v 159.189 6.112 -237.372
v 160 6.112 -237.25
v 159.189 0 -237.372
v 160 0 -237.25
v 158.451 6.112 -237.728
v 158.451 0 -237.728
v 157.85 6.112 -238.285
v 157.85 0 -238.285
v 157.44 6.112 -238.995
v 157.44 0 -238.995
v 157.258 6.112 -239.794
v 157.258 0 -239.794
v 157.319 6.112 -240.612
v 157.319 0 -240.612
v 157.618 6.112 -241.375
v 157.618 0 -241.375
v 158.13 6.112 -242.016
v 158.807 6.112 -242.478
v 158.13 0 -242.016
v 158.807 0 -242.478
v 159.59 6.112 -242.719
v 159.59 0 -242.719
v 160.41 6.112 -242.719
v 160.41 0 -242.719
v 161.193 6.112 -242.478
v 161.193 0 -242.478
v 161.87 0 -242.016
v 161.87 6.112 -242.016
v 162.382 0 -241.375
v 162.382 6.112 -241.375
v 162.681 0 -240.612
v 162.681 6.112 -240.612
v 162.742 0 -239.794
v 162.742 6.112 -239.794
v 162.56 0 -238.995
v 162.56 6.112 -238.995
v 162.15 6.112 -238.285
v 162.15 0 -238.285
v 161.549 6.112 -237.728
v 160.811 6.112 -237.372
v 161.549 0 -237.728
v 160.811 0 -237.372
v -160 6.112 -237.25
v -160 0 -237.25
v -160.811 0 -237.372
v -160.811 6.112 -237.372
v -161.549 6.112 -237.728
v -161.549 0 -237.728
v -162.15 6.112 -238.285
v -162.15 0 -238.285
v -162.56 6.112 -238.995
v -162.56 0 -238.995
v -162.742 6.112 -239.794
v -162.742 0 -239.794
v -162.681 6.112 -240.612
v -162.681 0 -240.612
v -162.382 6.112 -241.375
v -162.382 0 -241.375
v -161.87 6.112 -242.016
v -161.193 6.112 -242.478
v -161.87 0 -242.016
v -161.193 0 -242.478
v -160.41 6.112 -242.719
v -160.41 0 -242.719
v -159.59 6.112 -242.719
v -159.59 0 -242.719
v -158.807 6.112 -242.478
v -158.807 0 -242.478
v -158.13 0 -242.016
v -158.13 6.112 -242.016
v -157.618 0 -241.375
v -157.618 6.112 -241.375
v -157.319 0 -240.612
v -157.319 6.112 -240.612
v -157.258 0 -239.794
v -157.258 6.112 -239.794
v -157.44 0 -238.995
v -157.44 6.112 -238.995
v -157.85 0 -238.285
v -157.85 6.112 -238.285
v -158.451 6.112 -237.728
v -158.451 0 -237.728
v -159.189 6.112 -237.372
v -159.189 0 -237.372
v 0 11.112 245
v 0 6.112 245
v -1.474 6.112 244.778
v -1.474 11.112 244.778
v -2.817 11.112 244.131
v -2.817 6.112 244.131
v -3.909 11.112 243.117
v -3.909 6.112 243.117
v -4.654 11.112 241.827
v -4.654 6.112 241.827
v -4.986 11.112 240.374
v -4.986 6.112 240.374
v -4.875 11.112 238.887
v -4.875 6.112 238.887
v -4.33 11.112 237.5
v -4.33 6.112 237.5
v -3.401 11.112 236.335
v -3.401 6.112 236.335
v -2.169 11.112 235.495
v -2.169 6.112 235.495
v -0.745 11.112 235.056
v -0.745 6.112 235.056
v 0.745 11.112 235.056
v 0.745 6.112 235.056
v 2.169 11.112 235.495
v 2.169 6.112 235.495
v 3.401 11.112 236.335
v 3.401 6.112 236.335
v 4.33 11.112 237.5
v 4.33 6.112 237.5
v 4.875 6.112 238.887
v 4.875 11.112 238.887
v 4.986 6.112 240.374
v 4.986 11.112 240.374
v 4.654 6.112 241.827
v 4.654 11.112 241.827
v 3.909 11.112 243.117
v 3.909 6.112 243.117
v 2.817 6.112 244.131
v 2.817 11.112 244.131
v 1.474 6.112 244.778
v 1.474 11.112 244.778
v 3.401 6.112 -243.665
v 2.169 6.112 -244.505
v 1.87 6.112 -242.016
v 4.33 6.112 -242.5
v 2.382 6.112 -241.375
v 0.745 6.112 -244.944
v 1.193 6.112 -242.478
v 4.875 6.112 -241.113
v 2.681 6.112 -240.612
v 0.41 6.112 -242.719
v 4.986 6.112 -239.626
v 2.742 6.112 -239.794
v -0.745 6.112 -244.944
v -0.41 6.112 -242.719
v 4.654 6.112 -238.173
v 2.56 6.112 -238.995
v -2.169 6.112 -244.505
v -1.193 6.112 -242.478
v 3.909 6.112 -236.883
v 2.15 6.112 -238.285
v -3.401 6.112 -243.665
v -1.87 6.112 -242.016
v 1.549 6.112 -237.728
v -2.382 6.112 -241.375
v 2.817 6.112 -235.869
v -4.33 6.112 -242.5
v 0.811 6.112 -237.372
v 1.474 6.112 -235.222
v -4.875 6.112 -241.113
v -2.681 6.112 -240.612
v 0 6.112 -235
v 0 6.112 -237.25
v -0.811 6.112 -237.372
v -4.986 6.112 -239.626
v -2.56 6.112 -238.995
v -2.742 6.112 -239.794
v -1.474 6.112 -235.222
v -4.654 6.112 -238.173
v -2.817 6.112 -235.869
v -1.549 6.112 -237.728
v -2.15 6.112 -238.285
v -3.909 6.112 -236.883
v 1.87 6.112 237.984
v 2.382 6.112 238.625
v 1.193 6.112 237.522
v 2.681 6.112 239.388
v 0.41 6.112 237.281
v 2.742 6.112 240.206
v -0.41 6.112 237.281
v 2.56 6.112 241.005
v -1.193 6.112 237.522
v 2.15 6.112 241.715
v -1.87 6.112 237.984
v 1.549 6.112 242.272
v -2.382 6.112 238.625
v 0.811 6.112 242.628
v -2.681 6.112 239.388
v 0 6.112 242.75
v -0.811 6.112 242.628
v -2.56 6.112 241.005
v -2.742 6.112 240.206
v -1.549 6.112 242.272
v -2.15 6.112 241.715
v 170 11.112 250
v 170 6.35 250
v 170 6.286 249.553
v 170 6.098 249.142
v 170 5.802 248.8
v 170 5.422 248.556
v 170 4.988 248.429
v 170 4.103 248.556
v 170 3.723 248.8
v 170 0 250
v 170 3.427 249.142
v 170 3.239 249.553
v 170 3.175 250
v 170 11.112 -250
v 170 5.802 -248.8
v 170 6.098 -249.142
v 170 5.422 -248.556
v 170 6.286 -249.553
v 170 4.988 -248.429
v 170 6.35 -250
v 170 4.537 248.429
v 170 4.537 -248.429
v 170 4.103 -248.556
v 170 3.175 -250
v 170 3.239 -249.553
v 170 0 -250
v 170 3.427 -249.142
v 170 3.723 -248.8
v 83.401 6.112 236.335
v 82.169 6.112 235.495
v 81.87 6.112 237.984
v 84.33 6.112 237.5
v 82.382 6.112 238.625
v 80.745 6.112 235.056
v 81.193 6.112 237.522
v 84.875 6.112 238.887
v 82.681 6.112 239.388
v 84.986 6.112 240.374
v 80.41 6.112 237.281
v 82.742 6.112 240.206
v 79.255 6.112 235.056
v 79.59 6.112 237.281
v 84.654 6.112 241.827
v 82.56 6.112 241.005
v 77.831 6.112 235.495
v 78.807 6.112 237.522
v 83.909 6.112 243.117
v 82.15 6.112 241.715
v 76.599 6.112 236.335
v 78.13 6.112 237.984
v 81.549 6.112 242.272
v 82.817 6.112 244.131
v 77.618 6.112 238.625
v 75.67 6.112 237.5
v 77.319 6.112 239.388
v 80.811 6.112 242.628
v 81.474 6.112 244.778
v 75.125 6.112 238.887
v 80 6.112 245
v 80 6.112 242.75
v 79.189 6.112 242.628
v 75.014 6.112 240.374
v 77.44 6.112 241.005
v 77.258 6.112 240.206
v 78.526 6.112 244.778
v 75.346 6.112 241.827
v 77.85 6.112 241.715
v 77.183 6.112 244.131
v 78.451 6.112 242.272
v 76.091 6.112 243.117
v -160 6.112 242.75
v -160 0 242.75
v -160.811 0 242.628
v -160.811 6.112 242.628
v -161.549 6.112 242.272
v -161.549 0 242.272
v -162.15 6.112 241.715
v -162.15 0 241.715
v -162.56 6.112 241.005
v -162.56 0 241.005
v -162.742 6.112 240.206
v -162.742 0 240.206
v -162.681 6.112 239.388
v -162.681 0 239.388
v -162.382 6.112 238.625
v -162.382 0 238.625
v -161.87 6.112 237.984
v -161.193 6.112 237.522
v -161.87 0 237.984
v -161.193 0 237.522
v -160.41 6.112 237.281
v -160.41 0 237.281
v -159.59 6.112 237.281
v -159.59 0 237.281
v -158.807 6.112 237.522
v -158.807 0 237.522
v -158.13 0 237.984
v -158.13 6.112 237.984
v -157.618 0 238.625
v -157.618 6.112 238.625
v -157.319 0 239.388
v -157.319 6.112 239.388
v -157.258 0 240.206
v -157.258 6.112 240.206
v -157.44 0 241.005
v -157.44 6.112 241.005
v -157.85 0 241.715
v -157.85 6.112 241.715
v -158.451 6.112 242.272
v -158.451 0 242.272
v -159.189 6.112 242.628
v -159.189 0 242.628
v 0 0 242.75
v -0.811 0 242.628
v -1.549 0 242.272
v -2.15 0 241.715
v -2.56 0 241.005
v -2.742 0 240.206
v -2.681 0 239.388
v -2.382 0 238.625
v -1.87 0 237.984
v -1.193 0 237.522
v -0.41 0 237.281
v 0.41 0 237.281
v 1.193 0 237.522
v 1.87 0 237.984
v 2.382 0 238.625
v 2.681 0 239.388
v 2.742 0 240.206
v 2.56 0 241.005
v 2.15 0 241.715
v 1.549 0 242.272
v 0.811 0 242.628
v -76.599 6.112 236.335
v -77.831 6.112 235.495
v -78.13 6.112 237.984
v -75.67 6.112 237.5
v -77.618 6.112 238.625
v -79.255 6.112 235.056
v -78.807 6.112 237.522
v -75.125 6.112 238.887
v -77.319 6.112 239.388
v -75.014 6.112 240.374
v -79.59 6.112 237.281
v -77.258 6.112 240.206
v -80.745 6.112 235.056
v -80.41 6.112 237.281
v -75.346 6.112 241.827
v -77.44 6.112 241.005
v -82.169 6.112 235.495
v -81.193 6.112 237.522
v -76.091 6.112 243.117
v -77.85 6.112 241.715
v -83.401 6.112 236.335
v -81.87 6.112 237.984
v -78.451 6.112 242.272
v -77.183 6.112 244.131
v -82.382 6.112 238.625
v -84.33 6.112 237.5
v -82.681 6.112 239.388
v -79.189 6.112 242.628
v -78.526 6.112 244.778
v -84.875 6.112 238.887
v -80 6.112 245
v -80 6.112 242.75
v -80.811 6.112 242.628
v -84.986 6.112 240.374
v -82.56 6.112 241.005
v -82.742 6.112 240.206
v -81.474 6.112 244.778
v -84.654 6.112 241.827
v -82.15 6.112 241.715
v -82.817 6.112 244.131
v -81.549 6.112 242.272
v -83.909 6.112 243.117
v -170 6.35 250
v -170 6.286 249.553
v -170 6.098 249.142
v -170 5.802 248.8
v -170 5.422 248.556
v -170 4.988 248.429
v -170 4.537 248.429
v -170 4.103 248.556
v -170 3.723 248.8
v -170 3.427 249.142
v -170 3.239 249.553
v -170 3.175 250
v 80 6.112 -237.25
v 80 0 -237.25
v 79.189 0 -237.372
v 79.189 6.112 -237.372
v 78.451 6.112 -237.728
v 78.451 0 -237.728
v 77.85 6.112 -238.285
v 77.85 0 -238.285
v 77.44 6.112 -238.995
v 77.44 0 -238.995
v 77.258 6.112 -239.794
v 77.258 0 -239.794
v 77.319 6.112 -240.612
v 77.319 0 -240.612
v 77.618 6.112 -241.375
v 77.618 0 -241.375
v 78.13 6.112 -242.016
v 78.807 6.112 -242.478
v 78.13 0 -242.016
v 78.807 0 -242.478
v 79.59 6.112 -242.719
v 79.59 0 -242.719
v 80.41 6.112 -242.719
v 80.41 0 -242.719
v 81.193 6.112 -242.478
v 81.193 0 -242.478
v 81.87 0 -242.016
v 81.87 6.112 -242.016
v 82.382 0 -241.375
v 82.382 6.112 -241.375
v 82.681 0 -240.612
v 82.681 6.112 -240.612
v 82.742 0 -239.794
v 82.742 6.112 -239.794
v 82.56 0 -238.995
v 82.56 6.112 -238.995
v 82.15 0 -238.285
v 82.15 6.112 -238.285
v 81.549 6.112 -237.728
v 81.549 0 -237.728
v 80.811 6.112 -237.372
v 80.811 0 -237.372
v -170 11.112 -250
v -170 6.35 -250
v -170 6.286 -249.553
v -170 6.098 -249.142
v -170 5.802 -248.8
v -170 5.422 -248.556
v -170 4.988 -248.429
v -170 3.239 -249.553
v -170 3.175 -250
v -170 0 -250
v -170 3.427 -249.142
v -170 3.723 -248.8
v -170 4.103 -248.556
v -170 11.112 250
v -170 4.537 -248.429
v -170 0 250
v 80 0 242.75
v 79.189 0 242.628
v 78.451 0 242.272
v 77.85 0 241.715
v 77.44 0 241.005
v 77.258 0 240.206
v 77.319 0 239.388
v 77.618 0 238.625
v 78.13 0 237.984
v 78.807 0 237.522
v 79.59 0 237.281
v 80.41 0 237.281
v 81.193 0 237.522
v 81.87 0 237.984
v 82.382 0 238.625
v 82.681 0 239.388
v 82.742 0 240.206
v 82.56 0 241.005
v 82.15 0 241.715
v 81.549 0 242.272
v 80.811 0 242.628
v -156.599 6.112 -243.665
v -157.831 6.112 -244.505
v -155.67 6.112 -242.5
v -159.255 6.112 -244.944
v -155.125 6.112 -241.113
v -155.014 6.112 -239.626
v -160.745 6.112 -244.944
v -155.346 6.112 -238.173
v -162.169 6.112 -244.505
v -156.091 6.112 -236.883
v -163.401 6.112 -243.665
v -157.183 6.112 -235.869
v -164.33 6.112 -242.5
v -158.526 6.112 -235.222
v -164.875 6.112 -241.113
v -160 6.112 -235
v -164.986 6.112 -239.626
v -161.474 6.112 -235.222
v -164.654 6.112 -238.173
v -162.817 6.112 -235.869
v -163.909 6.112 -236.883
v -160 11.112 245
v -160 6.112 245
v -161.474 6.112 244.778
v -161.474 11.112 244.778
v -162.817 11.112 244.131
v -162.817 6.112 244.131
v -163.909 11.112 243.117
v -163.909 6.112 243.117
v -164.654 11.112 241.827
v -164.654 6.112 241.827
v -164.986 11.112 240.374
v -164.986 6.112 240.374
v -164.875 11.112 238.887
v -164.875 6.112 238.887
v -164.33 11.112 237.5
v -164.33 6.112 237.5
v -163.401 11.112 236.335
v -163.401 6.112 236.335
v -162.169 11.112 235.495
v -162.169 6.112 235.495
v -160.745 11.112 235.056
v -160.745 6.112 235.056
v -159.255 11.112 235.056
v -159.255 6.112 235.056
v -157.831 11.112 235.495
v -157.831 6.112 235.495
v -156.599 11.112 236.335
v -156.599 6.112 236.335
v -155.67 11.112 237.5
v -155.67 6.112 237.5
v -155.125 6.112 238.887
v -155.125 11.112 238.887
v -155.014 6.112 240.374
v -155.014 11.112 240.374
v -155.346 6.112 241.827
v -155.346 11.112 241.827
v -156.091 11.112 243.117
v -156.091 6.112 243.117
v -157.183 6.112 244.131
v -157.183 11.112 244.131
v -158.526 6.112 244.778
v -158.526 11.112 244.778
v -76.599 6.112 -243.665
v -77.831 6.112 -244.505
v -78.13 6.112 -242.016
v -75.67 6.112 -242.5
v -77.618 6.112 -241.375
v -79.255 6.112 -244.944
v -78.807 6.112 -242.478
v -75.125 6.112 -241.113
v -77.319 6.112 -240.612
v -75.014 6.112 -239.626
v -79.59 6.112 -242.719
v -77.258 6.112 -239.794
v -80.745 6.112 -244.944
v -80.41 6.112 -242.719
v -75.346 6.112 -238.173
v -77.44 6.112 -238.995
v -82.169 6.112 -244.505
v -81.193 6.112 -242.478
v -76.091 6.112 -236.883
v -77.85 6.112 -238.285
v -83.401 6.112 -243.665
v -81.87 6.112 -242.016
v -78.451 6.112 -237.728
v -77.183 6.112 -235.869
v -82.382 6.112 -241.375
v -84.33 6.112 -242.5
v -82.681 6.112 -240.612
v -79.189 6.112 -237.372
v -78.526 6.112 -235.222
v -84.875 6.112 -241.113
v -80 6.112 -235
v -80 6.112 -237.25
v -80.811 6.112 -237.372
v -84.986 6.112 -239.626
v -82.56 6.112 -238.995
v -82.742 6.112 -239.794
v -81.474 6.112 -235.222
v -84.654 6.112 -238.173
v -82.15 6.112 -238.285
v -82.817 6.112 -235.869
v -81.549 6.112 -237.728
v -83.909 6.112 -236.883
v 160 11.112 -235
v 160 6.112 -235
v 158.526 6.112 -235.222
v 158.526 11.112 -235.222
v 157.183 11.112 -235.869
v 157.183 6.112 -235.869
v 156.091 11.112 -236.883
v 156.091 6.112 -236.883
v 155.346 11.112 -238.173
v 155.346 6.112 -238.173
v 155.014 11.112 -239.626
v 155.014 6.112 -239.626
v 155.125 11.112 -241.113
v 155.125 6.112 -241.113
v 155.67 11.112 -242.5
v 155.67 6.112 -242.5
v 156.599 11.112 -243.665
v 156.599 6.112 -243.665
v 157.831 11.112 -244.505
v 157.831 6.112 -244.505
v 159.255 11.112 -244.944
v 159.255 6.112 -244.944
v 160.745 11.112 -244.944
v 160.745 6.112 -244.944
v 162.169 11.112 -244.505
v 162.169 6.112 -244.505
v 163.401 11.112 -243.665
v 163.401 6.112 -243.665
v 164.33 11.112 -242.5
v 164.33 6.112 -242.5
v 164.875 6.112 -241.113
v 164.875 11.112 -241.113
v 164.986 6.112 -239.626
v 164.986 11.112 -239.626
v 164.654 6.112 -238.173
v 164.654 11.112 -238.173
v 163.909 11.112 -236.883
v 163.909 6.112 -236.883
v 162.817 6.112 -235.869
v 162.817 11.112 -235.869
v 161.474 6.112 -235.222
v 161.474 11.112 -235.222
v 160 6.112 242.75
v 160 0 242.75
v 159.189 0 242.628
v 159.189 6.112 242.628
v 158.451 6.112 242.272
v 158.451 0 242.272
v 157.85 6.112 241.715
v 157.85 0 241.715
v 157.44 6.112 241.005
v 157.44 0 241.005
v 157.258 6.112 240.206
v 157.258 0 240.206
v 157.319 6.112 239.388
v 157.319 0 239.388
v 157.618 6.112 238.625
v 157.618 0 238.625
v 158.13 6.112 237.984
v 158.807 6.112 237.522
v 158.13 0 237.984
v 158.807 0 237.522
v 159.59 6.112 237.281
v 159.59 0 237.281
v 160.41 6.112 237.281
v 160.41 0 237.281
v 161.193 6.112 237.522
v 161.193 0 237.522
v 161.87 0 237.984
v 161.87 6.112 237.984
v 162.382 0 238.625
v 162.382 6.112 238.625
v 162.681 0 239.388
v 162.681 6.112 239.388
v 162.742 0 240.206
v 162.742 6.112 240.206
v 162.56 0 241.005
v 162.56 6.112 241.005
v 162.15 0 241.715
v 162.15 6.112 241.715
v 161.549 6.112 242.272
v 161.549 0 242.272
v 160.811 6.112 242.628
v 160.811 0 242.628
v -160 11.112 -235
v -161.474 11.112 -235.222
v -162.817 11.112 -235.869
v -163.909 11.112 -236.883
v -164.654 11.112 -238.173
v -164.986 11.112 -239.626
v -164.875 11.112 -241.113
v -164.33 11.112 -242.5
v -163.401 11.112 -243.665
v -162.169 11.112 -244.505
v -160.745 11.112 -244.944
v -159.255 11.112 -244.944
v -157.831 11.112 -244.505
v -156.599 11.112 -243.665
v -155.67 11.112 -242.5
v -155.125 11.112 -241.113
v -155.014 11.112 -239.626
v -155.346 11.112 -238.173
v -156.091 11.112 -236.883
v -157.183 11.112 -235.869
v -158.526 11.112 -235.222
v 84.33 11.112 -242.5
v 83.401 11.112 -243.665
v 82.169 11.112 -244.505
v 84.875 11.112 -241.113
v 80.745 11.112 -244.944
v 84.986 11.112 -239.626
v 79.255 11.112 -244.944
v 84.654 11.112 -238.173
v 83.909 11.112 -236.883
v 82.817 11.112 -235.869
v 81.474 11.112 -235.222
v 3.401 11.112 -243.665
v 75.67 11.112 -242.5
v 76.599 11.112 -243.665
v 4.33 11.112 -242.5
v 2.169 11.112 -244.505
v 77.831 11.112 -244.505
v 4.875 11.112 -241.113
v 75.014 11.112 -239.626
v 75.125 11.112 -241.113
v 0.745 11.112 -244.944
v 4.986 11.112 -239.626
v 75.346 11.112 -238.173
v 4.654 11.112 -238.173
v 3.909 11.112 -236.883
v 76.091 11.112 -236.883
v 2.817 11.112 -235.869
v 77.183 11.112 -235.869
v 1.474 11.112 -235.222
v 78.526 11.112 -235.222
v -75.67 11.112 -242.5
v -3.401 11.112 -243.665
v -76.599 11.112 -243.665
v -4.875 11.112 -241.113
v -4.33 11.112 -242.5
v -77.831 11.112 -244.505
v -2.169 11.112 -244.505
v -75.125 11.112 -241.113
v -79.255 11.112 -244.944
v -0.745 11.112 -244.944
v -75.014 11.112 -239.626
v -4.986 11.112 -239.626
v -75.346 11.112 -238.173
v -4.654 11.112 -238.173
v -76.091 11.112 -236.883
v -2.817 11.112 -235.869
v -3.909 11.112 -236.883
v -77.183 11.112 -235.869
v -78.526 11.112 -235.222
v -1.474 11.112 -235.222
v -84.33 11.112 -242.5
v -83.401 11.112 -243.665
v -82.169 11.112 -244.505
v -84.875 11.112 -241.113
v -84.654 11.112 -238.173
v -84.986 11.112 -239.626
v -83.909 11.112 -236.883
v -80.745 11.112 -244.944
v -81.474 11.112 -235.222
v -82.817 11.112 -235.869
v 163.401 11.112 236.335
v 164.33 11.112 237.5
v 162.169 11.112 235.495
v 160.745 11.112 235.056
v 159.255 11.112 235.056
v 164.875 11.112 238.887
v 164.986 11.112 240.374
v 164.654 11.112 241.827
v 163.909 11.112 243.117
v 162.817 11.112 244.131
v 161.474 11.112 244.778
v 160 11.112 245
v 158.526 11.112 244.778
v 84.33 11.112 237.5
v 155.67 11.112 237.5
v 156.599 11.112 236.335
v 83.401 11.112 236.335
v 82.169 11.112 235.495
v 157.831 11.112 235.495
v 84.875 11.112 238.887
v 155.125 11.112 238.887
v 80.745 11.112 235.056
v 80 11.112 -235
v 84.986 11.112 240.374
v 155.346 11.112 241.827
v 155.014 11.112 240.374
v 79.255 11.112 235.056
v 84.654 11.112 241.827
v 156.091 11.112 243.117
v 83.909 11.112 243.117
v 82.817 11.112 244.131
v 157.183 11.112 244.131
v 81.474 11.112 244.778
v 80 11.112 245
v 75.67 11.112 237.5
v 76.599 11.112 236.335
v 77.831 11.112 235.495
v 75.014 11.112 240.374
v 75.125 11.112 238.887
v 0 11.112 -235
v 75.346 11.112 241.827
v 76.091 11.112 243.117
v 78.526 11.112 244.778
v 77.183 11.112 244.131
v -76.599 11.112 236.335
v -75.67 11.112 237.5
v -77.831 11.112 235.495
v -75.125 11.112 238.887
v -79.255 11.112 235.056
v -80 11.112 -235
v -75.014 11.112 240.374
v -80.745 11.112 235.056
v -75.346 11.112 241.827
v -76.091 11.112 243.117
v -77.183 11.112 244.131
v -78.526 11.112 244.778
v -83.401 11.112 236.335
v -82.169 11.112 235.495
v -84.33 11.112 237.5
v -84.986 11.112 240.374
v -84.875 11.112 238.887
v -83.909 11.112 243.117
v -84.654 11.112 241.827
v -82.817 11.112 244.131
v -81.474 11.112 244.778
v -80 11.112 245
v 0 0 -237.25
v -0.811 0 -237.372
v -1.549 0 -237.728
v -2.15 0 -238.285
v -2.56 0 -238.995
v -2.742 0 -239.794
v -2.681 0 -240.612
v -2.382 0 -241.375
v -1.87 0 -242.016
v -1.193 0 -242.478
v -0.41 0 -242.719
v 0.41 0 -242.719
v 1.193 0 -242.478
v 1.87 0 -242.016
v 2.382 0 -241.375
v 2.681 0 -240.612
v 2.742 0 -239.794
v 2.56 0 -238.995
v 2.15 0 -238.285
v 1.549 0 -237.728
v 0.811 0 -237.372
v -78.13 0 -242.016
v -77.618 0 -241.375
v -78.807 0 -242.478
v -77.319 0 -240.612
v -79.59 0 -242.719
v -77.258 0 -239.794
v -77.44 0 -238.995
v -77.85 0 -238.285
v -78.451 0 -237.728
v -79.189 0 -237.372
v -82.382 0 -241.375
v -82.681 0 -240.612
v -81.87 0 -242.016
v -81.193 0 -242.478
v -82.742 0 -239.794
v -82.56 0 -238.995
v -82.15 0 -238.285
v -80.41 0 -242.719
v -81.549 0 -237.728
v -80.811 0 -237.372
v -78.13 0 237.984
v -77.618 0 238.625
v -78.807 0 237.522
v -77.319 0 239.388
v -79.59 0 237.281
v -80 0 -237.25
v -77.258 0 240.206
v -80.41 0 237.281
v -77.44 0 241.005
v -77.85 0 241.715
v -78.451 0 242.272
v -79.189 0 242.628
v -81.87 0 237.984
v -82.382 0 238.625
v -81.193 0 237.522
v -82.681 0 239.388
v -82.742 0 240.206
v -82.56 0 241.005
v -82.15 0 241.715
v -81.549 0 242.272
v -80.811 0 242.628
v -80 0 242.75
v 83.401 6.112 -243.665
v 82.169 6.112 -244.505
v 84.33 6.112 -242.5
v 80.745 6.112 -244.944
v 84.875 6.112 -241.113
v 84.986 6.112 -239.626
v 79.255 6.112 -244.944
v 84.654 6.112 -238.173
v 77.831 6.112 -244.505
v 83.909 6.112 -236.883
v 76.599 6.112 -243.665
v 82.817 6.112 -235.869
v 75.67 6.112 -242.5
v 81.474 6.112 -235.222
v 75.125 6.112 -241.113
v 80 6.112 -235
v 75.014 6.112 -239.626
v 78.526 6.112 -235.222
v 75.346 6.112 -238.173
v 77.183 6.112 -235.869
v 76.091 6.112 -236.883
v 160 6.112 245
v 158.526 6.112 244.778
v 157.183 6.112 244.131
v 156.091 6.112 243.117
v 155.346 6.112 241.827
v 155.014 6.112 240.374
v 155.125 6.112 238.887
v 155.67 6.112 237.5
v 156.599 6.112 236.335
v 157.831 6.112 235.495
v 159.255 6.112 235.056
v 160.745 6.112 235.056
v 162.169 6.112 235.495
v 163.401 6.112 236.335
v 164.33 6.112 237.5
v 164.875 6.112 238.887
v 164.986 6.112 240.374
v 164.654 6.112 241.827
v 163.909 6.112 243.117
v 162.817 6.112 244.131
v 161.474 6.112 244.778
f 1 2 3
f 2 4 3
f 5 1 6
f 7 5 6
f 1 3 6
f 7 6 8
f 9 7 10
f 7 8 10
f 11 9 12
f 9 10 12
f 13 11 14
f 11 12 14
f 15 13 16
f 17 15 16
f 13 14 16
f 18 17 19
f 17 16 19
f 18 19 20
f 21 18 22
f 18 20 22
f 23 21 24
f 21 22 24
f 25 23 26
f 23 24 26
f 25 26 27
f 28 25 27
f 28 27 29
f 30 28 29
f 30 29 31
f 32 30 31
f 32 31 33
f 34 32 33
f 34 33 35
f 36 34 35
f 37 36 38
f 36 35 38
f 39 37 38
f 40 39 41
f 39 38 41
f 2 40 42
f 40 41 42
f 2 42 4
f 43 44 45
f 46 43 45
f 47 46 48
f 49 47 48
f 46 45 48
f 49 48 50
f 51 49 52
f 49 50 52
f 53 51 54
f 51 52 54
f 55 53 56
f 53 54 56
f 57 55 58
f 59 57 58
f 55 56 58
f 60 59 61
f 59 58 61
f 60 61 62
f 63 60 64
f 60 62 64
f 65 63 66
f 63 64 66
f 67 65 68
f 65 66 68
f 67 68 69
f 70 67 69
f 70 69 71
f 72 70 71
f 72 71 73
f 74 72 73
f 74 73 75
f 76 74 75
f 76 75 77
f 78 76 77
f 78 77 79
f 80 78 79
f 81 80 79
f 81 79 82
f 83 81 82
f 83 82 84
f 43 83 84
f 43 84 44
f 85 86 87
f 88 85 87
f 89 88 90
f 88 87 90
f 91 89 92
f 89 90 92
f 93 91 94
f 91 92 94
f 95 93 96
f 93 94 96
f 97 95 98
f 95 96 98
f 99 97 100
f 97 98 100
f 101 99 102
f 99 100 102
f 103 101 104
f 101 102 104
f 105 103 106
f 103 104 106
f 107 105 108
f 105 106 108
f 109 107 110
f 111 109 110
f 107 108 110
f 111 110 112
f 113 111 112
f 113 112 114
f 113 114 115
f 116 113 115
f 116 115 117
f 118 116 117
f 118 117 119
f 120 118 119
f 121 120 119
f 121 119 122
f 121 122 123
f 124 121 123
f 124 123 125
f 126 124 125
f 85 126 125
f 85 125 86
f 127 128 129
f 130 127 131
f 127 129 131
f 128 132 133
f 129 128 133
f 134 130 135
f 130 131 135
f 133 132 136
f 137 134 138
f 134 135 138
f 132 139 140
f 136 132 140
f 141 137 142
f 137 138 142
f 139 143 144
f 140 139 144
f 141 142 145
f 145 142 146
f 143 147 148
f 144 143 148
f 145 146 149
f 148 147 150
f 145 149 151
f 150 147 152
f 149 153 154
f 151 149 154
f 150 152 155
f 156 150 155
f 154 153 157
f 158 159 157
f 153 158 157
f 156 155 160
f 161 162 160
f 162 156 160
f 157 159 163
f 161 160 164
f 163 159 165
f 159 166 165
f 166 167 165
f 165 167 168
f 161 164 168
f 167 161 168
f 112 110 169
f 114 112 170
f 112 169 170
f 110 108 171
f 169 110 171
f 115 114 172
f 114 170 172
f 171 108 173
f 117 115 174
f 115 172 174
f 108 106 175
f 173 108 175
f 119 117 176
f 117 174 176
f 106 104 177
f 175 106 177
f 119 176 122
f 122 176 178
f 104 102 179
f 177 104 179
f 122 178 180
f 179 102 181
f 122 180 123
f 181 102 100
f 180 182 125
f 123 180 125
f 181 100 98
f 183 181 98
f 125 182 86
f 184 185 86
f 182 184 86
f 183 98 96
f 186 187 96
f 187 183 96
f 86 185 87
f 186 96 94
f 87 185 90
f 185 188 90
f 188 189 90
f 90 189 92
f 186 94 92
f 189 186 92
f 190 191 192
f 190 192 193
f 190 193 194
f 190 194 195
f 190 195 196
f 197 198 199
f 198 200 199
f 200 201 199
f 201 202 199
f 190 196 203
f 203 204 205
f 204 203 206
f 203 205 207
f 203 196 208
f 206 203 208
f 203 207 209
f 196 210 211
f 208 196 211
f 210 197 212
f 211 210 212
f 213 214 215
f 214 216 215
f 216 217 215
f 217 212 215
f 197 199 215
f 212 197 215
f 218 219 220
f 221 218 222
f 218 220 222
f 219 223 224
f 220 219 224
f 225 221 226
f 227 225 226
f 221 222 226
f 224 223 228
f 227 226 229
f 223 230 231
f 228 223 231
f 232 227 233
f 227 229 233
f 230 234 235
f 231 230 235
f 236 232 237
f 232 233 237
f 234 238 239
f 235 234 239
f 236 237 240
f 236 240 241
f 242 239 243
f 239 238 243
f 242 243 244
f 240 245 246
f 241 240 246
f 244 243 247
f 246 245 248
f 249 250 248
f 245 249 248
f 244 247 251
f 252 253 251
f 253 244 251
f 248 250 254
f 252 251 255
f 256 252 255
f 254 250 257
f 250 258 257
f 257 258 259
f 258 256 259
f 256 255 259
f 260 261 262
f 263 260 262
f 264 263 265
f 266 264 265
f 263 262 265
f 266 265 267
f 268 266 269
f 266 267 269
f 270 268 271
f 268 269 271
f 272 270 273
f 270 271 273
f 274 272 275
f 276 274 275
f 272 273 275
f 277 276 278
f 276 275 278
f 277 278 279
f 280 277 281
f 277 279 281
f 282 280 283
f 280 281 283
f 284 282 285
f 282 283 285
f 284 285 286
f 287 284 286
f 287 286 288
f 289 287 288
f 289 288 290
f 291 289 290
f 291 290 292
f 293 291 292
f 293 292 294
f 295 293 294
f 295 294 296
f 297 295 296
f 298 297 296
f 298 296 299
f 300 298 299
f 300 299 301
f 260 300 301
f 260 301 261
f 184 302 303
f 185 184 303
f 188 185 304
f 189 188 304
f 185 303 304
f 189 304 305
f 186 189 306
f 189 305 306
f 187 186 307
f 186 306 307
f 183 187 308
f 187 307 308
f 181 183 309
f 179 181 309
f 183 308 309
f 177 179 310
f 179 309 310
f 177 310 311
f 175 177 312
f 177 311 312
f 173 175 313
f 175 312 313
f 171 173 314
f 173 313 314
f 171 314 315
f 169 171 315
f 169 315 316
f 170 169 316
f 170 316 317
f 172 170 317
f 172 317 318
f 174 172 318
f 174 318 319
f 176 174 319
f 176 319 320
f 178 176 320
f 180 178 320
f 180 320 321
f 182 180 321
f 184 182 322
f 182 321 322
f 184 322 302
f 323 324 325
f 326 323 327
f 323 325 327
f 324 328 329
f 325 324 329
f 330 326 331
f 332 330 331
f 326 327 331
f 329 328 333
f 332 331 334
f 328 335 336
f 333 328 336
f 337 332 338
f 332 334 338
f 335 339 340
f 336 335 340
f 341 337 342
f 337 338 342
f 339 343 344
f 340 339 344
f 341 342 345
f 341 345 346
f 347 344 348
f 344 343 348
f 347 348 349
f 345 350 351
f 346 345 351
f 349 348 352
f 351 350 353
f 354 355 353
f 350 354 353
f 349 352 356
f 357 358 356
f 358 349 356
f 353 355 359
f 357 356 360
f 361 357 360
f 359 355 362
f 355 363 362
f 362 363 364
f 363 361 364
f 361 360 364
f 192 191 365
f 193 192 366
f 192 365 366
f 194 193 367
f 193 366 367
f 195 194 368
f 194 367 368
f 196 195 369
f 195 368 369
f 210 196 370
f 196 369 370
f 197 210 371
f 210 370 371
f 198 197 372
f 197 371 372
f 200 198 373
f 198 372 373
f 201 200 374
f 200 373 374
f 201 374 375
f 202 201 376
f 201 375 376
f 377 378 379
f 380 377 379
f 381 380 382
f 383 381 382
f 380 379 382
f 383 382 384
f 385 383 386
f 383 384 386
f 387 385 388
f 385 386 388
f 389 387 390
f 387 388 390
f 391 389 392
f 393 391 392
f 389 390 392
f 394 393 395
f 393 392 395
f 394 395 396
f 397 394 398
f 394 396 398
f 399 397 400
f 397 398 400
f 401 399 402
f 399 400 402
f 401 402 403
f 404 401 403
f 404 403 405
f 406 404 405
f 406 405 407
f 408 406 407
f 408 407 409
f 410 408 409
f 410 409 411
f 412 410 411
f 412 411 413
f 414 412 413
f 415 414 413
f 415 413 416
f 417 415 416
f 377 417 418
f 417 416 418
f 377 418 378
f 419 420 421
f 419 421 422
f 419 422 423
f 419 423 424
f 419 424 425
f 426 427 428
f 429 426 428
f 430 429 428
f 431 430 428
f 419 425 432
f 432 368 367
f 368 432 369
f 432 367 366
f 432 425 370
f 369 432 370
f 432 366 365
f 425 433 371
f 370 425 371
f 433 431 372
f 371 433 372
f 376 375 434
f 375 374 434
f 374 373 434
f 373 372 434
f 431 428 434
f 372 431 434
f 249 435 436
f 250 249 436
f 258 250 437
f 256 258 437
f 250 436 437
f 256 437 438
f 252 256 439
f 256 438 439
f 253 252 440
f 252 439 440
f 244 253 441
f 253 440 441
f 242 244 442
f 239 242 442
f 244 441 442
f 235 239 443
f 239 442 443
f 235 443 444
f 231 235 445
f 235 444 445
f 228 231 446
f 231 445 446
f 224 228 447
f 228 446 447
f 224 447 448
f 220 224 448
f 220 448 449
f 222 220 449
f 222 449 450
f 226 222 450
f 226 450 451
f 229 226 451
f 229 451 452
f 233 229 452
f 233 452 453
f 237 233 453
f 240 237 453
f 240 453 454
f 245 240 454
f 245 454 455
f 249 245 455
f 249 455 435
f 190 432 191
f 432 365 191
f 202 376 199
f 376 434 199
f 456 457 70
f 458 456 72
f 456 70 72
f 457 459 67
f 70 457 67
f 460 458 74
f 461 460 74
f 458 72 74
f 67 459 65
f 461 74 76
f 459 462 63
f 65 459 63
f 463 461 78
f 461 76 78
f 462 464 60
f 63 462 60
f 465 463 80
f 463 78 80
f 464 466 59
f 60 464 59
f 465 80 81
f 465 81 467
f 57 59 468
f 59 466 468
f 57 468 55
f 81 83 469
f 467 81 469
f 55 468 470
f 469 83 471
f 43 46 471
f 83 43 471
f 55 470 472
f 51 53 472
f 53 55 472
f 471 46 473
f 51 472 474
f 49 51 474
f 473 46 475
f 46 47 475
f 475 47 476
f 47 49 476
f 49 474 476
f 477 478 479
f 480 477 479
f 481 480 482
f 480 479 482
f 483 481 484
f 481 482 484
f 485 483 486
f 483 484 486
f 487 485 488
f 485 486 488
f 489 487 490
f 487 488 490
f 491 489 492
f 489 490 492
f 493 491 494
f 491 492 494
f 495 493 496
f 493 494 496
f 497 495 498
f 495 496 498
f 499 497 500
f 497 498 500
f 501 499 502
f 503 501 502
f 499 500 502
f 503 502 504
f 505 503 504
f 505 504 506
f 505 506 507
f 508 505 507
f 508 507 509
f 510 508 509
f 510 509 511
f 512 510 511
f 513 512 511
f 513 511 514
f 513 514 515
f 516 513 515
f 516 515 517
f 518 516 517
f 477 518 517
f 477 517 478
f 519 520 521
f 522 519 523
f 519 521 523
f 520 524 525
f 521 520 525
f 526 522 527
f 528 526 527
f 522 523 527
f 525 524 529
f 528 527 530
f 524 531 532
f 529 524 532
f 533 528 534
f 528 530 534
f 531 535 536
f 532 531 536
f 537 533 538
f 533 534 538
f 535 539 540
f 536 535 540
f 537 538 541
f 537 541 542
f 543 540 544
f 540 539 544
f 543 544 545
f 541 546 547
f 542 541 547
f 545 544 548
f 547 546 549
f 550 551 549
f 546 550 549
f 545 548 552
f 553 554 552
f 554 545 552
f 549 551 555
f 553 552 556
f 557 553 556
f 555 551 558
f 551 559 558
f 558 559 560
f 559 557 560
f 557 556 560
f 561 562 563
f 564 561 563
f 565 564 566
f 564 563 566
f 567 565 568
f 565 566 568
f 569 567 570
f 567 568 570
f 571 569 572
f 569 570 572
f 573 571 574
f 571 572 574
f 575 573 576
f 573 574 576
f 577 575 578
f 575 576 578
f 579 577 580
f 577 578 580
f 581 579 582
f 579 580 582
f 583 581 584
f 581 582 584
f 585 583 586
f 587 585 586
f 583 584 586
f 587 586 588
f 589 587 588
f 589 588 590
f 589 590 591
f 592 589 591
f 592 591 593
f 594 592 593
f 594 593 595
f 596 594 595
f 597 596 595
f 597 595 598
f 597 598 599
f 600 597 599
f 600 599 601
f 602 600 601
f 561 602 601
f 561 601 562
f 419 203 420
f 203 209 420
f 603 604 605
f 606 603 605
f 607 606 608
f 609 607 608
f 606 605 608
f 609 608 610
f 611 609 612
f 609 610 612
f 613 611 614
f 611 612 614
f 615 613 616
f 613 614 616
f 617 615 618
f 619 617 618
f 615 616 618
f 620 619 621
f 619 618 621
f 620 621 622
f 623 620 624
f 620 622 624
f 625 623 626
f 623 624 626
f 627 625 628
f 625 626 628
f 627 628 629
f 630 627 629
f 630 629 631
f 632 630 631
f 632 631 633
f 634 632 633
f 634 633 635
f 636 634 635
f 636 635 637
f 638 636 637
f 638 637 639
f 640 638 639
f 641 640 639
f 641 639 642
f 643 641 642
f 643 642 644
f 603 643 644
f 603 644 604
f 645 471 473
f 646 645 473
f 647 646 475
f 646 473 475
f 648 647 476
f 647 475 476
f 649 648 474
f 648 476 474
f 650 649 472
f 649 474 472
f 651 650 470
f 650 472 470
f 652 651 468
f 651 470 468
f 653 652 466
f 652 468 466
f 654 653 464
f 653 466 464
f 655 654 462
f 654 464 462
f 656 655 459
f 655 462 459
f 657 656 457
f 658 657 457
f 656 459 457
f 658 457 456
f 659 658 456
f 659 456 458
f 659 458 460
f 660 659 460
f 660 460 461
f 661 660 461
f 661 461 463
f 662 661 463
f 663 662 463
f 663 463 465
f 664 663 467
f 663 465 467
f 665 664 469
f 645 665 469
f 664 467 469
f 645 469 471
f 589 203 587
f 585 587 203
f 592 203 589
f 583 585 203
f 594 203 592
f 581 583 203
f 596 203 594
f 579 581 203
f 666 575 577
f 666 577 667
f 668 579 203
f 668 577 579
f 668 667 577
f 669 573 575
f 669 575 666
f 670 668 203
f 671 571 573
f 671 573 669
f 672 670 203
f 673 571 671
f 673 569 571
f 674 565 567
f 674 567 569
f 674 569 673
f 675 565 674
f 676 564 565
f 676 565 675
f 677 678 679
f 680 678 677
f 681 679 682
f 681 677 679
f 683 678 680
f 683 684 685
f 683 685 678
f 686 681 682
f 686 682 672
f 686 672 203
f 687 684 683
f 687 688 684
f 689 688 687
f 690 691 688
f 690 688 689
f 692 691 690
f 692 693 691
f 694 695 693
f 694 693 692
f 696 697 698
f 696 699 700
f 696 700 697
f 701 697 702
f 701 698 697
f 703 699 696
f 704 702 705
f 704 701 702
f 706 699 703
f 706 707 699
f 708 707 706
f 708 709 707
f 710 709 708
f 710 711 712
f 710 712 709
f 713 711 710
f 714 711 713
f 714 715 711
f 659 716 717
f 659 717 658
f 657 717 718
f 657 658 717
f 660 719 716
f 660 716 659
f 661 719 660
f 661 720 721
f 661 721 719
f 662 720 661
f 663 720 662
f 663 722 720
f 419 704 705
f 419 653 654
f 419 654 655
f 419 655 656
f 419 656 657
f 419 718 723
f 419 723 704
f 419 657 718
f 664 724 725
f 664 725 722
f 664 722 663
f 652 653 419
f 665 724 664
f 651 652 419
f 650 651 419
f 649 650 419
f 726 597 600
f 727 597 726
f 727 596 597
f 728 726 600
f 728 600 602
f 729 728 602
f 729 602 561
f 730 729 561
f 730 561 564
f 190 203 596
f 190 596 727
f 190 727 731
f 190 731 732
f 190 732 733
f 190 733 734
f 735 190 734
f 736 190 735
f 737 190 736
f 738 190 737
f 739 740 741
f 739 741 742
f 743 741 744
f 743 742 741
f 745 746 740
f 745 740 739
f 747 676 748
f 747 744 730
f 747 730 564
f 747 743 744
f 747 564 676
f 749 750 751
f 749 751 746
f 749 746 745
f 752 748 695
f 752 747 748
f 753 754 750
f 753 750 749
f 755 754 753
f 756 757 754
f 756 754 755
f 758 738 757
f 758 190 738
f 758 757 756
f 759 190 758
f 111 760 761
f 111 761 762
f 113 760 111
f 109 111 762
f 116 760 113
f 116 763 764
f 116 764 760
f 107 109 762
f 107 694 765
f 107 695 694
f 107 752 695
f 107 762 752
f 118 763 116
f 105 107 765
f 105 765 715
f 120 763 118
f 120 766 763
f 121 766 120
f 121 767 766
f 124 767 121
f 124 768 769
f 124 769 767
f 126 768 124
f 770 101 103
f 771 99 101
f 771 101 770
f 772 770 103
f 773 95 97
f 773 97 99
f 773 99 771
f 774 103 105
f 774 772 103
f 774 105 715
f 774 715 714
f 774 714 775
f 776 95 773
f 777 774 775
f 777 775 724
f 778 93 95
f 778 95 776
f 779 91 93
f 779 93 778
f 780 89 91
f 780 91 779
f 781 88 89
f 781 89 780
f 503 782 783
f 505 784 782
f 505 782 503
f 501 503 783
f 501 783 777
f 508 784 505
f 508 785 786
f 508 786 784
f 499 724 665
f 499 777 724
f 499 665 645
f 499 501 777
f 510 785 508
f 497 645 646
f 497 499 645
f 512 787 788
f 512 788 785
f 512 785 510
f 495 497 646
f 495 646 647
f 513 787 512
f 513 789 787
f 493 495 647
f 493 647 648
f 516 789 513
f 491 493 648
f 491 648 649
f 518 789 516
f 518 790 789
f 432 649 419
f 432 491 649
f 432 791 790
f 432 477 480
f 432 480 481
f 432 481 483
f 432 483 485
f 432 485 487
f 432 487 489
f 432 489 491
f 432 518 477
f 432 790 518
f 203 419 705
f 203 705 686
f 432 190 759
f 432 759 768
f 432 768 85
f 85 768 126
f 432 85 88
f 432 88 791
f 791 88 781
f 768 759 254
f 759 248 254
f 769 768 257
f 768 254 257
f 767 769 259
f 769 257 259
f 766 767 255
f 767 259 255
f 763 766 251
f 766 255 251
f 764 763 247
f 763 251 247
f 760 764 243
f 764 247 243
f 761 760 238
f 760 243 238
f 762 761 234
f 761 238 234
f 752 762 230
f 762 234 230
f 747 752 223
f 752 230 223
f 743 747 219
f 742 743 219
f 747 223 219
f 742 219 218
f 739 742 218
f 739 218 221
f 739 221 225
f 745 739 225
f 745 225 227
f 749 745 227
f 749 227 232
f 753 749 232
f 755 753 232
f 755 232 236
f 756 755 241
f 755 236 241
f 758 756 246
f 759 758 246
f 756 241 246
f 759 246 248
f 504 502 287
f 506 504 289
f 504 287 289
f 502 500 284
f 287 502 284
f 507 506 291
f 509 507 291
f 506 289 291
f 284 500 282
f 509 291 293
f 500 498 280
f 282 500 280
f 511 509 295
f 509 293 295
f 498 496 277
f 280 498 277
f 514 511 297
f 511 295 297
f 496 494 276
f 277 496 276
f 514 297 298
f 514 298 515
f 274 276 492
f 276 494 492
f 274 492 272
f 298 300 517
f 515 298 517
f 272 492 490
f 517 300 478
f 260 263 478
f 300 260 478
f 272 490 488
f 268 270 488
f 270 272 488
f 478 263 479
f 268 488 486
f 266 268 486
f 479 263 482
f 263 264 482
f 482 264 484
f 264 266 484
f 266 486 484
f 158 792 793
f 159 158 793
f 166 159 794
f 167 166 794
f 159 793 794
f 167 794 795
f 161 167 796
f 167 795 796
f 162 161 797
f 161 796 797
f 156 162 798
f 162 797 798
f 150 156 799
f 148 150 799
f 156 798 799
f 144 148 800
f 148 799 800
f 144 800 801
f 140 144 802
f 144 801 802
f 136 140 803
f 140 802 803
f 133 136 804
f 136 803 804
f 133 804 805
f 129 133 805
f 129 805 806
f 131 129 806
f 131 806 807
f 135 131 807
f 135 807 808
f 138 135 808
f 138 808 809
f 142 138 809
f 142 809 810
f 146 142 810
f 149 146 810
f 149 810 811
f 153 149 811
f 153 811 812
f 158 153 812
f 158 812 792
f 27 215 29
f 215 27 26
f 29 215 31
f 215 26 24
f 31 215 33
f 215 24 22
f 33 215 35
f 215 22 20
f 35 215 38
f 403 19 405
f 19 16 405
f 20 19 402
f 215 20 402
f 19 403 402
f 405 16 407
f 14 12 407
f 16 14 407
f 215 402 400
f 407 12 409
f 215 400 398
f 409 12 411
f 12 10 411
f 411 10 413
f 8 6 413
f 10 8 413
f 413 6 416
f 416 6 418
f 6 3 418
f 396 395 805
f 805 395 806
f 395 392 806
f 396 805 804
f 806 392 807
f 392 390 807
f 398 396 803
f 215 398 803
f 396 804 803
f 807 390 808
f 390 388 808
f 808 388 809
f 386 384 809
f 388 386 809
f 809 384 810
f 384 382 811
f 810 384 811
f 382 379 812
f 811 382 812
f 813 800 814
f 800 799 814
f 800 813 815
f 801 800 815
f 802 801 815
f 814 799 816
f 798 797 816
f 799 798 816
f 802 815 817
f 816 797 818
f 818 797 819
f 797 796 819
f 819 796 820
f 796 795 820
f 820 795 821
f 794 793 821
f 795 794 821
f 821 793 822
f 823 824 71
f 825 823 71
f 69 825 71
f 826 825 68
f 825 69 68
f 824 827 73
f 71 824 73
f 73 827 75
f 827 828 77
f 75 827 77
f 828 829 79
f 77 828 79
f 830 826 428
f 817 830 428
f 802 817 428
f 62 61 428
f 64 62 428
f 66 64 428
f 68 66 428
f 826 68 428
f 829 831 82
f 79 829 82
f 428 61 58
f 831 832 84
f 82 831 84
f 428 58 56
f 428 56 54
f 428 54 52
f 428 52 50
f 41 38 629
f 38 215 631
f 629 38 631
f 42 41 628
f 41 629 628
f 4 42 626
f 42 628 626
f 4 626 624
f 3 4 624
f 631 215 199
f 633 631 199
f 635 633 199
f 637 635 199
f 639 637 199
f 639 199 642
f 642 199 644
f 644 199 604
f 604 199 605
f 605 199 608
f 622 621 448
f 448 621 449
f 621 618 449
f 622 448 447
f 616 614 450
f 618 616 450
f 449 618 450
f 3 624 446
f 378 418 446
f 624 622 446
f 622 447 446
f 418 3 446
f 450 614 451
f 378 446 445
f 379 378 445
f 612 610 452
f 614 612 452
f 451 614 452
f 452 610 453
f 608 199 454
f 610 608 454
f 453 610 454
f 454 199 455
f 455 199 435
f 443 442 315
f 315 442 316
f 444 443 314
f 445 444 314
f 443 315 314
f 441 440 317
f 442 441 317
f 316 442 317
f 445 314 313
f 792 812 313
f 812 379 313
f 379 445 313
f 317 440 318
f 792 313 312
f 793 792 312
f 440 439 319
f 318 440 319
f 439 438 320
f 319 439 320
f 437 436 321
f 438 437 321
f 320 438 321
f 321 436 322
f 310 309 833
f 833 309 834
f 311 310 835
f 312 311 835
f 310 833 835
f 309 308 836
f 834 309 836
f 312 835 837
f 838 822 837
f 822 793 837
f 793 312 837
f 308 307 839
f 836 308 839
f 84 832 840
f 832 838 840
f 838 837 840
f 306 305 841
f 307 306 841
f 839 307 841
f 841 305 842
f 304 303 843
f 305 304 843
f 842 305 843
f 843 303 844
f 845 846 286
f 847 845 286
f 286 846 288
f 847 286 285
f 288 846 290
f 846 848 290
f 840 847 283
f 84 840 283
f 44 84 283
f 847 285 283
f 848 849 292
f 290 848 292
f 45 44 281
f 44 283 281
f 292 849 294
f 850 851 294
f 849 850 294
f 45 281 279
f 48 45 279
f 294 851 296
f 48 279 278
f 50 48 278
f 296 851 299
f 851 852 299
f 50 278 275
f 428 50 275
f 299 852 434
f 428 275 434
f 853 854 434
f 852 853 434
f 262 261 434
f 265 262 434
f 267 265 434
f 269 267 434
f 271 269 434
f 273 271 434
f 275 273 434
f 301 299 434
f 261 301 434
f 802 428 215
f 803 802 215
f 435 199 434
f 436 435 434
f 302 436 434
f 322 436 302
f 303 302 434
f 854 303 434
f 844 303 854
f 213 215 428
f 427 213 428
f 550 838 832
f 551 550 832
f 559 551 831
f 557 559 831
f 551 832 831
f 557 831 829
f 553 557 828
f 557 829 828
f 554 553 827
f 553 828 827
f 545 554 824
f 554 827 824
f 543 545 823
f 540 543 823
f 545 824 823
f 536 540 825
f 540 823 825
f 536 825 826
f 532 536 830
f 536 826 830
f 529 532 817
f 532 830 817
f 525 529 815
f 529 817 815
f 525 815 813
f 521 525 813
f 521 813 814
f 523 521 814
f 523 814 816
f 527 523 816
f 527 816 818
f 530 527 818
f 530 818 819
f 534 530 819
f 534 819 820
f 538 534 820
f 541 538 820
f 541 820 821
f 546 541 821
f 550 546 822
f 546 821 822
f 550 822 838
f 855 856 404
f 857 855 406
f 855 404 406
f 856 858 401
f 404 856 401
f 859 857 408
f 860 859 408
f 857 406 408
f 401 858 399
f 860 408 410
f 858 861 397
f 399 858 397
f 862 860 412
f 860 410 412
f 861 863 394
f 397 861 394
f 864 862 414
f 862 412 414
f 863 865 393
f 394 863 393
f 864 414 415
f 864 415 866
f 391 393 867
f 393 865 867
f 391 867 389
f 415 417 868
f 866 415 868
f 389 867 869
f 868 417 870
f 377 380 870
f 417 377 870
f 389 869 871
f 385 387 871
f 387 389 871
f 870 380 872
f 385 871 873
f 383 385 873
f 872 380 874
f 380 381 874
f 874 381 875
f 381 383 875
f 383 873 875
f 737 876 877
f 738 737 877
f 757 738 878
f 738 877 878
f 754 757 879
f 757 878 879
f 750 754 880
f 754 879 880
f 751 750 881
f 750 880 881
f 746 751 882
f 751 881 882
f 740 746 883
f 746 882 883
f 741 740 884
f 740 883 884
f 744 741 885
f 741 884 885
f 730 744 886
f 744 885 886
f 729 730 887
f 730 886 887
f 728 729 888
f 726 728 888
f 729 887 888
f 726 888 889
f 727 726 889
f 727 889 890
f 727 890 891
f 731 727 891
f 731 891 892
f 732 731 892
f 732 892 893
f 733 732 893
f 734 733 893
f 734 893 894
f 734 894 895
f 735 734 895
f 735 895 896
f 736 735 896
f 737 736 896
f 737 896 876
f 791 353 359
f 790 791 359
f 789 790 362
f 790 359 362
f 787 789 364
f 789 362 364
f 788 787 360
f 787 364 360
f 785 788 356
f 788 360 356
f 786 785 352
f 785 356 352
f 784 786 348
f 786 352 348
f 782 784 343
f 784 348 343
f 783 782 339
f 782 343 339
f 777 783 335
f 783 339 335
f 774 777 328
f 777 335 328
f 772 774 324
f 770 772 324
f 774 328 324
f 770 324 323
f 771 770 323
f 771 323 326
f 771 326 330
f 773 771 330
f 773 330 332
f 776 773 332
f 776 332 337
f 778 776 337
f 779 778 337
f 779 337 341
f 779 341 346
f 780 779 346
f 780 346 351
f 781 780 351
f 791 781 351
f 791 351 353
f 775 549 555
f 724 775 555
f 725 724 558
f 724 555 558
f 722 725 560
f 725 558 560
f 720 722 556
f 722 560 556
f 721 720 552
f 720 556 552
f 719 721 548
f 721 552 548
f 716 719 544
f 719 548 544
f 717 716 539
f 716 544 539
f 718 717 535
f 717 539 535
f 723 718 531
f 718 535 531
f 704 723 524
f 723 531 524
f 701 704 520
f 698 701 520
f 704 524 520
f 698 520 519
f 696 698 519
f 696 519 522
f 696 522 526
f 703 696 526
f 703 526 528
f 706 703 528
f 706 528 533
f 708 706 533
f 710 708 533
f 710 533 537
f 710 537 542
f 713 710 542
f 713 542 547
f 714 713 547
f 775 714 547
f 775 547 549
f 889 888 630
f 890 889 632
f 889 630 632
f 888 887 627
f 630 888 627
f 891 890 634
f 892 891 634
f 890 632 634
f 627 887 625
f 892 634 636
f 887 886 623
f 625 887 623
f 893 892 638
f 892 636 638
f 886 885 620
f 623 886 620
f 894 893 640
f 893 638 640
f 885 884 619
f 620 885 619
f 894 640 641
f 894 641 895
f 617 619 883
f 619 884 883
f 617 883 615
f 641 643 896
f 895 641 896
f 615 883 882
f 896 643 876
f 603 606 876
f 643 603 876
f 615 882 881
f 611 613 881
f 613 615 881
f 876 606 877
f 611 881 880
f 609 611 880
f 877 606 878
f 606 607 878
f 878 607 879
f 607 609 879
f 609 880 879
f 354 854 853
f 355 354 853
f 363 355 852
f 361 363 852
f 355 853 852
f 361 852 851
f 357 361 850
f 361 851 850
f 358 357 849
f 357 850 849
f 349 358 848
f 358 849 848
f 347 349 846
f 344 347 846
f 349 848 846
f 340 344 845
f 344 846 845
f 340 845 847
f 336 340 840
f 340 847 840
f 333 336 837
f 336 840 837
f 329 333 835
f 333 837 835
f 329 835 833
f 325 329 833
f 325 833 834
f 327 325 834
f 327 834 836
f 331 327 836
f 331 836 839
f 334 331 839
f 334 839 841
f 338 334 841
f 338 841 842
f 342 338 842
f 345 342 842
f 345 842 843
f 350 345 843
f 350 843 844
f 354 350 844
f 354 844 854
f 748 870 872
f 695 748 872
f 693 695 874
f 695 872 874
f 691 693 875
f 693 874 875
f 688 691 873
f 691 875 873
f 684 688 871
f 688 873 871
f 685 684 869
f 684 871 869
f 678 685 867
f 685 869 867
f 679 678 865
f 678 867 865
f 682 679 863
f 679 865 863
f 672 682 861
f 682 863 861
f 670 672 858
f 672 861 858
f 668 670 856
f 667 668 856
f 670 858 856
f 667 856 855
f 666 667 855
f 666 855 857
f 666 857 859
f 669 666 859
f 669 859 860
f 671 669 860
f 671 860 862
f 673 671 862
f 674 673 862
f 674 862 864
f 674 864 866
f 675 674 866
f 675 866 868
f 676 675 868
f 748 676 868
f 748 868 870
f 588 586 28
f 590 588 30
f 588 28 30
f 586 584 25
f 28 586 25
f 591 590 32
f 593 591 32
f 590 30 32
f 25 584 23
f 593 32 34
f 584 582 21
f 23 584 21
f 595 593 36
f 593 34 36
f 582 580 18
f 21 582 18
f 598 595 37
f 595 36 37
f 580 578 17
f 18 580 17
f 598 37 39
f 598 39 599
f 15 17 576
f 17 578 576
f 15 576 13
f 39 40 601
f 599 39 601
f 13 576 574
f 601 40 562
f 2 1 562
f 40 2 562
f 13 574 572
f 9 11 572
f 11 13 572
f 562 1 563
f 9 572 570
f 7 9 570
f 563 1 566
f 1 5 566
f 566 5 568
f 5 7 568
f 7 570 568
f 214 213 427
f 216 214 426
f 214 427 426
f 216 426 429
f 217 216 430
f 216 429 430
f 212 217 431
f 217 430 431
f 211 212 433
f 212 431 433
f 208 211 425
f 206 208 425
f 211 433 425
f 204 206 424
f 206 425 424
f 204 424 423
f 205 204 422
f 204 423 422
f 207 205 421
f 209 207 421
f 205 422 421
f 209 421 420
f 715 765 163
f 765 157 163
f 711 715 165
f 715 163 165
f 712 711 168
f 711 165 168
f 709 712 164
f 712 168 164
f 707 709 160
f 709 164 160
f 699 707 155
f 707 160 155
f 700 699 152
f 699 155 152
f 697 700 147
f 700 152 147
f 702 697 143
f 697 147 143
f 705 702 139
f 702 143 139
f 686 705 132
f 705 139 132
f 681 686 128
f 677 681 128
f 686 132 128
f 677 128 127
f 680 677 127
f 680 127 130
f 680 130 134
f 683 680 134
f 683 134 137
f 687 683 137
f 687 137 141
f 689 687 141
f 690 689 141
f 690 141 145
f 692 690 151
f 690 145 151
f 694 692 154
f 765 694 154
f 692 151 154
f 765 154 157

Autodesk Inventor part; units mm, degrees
ref_plane "YZ Plane" through (0, 0, 0) normal (1, 0, 0) x (0, 1, 0)
ref_plane "XZ Plane" through (0, 0, 0) normal (0, 1, 0) x (-1, 0, 0)
ref_plane "XY Plane" through (0, 0, 0) normal (0, 0, 1) x (1, 0, 0)
sketch "Sketch1" plane through (0, 0, 0) normal (0, 1, 0) x (-1, 0, 0)
  line L0 (170, 250) -> (-170, 250)
  line L1 (-170, 250) -> (-170, -250)
  line L2 (-170, -250) -> (170, -250)
  line L3 (170, -250) -> (170, 250)
  line L4 (170, 250) -> (-170, -250) construction
  line L5 (-170, 250) -> (170, -250) construction
  point P0 (0, 0)
  dimension "d0" = 340
  dimension "d1" = 500
extrude "Extrusion1" add sketch "Sketch1" along normal blind 11.1125
sketch "Sketch2" plane through (0, 11.1125, 0) normal (0, 1, 0) x (1, 0, 0)
  line L0 (-170, -250) -> (170, -250) projected
  line L1 (170, -250) -> (170, 250) projected
  line L2 (170, 250) -> (-170, 250) projected
  line L3 (-170, 250) -> (-170, -250) projected
  point P0 (0, 0)
  point P1 (-160, -240)
  dimension "d4" = 10
  dimension "d5" = 10
hole "Hole1" at (-160, 11.1125, 240) direction (0, -1, 0) diameter 5.5 end through all counterbore diameter 10 counterbore depth 5 clearance for "Socket Head Cap Screw" size "M5" standard "Ansi Metric M Profile"
pattern_linear "Rectangular Pattern1" count 2 spacing 480 along (0, 0, -1) count 5 spacing 80 along (1, 0, 0) of "Hole1"
sketch "Sketch3" plane through (-170, 0, -250) normal (-1, 0, 0) x (0, 0, 1)
  line L0 (0, 0) -> (500, 0) projected
  line L1 (500, 0) -> (500, 11.1125) projected
  line L2 (0, 11.1125) -> (500, 11.1125) projected
  line L3 (0, 0) -> (0, 11.1125) projected
  line L4 (0, 0) -> (0, 11.1125) projected
  arc A0 (0, 3.175) -> (0, 6.35) centre (0, 4.7625) ccw
  point P0 (250, 0)
  dimension "d19" = 1.5875
  dimension "d20" = 6.35
extrude "oRingGroove" cut sketch "Sketch3" against normal through all contours L3 A0
mirror "Mirror1" about plane through (0, 0, 0) normal (0, 0, 1) of "oRingGroove"
equation "\"d1\" = depth"
equation "\"d2\" = facingThickness - facingGasketThickness"
equation "\"d19\" = 0.125 * facingThickness"
equation "\"d20\" = 0.5 * facingThickness"
equation "\"depth\" = 500"
equation "\"facingThickness\" = 12.7"
equation "\"facingGasketThickness\" = 1.5875"
properties part number "sideFace" material "Wood (Cherry)"
